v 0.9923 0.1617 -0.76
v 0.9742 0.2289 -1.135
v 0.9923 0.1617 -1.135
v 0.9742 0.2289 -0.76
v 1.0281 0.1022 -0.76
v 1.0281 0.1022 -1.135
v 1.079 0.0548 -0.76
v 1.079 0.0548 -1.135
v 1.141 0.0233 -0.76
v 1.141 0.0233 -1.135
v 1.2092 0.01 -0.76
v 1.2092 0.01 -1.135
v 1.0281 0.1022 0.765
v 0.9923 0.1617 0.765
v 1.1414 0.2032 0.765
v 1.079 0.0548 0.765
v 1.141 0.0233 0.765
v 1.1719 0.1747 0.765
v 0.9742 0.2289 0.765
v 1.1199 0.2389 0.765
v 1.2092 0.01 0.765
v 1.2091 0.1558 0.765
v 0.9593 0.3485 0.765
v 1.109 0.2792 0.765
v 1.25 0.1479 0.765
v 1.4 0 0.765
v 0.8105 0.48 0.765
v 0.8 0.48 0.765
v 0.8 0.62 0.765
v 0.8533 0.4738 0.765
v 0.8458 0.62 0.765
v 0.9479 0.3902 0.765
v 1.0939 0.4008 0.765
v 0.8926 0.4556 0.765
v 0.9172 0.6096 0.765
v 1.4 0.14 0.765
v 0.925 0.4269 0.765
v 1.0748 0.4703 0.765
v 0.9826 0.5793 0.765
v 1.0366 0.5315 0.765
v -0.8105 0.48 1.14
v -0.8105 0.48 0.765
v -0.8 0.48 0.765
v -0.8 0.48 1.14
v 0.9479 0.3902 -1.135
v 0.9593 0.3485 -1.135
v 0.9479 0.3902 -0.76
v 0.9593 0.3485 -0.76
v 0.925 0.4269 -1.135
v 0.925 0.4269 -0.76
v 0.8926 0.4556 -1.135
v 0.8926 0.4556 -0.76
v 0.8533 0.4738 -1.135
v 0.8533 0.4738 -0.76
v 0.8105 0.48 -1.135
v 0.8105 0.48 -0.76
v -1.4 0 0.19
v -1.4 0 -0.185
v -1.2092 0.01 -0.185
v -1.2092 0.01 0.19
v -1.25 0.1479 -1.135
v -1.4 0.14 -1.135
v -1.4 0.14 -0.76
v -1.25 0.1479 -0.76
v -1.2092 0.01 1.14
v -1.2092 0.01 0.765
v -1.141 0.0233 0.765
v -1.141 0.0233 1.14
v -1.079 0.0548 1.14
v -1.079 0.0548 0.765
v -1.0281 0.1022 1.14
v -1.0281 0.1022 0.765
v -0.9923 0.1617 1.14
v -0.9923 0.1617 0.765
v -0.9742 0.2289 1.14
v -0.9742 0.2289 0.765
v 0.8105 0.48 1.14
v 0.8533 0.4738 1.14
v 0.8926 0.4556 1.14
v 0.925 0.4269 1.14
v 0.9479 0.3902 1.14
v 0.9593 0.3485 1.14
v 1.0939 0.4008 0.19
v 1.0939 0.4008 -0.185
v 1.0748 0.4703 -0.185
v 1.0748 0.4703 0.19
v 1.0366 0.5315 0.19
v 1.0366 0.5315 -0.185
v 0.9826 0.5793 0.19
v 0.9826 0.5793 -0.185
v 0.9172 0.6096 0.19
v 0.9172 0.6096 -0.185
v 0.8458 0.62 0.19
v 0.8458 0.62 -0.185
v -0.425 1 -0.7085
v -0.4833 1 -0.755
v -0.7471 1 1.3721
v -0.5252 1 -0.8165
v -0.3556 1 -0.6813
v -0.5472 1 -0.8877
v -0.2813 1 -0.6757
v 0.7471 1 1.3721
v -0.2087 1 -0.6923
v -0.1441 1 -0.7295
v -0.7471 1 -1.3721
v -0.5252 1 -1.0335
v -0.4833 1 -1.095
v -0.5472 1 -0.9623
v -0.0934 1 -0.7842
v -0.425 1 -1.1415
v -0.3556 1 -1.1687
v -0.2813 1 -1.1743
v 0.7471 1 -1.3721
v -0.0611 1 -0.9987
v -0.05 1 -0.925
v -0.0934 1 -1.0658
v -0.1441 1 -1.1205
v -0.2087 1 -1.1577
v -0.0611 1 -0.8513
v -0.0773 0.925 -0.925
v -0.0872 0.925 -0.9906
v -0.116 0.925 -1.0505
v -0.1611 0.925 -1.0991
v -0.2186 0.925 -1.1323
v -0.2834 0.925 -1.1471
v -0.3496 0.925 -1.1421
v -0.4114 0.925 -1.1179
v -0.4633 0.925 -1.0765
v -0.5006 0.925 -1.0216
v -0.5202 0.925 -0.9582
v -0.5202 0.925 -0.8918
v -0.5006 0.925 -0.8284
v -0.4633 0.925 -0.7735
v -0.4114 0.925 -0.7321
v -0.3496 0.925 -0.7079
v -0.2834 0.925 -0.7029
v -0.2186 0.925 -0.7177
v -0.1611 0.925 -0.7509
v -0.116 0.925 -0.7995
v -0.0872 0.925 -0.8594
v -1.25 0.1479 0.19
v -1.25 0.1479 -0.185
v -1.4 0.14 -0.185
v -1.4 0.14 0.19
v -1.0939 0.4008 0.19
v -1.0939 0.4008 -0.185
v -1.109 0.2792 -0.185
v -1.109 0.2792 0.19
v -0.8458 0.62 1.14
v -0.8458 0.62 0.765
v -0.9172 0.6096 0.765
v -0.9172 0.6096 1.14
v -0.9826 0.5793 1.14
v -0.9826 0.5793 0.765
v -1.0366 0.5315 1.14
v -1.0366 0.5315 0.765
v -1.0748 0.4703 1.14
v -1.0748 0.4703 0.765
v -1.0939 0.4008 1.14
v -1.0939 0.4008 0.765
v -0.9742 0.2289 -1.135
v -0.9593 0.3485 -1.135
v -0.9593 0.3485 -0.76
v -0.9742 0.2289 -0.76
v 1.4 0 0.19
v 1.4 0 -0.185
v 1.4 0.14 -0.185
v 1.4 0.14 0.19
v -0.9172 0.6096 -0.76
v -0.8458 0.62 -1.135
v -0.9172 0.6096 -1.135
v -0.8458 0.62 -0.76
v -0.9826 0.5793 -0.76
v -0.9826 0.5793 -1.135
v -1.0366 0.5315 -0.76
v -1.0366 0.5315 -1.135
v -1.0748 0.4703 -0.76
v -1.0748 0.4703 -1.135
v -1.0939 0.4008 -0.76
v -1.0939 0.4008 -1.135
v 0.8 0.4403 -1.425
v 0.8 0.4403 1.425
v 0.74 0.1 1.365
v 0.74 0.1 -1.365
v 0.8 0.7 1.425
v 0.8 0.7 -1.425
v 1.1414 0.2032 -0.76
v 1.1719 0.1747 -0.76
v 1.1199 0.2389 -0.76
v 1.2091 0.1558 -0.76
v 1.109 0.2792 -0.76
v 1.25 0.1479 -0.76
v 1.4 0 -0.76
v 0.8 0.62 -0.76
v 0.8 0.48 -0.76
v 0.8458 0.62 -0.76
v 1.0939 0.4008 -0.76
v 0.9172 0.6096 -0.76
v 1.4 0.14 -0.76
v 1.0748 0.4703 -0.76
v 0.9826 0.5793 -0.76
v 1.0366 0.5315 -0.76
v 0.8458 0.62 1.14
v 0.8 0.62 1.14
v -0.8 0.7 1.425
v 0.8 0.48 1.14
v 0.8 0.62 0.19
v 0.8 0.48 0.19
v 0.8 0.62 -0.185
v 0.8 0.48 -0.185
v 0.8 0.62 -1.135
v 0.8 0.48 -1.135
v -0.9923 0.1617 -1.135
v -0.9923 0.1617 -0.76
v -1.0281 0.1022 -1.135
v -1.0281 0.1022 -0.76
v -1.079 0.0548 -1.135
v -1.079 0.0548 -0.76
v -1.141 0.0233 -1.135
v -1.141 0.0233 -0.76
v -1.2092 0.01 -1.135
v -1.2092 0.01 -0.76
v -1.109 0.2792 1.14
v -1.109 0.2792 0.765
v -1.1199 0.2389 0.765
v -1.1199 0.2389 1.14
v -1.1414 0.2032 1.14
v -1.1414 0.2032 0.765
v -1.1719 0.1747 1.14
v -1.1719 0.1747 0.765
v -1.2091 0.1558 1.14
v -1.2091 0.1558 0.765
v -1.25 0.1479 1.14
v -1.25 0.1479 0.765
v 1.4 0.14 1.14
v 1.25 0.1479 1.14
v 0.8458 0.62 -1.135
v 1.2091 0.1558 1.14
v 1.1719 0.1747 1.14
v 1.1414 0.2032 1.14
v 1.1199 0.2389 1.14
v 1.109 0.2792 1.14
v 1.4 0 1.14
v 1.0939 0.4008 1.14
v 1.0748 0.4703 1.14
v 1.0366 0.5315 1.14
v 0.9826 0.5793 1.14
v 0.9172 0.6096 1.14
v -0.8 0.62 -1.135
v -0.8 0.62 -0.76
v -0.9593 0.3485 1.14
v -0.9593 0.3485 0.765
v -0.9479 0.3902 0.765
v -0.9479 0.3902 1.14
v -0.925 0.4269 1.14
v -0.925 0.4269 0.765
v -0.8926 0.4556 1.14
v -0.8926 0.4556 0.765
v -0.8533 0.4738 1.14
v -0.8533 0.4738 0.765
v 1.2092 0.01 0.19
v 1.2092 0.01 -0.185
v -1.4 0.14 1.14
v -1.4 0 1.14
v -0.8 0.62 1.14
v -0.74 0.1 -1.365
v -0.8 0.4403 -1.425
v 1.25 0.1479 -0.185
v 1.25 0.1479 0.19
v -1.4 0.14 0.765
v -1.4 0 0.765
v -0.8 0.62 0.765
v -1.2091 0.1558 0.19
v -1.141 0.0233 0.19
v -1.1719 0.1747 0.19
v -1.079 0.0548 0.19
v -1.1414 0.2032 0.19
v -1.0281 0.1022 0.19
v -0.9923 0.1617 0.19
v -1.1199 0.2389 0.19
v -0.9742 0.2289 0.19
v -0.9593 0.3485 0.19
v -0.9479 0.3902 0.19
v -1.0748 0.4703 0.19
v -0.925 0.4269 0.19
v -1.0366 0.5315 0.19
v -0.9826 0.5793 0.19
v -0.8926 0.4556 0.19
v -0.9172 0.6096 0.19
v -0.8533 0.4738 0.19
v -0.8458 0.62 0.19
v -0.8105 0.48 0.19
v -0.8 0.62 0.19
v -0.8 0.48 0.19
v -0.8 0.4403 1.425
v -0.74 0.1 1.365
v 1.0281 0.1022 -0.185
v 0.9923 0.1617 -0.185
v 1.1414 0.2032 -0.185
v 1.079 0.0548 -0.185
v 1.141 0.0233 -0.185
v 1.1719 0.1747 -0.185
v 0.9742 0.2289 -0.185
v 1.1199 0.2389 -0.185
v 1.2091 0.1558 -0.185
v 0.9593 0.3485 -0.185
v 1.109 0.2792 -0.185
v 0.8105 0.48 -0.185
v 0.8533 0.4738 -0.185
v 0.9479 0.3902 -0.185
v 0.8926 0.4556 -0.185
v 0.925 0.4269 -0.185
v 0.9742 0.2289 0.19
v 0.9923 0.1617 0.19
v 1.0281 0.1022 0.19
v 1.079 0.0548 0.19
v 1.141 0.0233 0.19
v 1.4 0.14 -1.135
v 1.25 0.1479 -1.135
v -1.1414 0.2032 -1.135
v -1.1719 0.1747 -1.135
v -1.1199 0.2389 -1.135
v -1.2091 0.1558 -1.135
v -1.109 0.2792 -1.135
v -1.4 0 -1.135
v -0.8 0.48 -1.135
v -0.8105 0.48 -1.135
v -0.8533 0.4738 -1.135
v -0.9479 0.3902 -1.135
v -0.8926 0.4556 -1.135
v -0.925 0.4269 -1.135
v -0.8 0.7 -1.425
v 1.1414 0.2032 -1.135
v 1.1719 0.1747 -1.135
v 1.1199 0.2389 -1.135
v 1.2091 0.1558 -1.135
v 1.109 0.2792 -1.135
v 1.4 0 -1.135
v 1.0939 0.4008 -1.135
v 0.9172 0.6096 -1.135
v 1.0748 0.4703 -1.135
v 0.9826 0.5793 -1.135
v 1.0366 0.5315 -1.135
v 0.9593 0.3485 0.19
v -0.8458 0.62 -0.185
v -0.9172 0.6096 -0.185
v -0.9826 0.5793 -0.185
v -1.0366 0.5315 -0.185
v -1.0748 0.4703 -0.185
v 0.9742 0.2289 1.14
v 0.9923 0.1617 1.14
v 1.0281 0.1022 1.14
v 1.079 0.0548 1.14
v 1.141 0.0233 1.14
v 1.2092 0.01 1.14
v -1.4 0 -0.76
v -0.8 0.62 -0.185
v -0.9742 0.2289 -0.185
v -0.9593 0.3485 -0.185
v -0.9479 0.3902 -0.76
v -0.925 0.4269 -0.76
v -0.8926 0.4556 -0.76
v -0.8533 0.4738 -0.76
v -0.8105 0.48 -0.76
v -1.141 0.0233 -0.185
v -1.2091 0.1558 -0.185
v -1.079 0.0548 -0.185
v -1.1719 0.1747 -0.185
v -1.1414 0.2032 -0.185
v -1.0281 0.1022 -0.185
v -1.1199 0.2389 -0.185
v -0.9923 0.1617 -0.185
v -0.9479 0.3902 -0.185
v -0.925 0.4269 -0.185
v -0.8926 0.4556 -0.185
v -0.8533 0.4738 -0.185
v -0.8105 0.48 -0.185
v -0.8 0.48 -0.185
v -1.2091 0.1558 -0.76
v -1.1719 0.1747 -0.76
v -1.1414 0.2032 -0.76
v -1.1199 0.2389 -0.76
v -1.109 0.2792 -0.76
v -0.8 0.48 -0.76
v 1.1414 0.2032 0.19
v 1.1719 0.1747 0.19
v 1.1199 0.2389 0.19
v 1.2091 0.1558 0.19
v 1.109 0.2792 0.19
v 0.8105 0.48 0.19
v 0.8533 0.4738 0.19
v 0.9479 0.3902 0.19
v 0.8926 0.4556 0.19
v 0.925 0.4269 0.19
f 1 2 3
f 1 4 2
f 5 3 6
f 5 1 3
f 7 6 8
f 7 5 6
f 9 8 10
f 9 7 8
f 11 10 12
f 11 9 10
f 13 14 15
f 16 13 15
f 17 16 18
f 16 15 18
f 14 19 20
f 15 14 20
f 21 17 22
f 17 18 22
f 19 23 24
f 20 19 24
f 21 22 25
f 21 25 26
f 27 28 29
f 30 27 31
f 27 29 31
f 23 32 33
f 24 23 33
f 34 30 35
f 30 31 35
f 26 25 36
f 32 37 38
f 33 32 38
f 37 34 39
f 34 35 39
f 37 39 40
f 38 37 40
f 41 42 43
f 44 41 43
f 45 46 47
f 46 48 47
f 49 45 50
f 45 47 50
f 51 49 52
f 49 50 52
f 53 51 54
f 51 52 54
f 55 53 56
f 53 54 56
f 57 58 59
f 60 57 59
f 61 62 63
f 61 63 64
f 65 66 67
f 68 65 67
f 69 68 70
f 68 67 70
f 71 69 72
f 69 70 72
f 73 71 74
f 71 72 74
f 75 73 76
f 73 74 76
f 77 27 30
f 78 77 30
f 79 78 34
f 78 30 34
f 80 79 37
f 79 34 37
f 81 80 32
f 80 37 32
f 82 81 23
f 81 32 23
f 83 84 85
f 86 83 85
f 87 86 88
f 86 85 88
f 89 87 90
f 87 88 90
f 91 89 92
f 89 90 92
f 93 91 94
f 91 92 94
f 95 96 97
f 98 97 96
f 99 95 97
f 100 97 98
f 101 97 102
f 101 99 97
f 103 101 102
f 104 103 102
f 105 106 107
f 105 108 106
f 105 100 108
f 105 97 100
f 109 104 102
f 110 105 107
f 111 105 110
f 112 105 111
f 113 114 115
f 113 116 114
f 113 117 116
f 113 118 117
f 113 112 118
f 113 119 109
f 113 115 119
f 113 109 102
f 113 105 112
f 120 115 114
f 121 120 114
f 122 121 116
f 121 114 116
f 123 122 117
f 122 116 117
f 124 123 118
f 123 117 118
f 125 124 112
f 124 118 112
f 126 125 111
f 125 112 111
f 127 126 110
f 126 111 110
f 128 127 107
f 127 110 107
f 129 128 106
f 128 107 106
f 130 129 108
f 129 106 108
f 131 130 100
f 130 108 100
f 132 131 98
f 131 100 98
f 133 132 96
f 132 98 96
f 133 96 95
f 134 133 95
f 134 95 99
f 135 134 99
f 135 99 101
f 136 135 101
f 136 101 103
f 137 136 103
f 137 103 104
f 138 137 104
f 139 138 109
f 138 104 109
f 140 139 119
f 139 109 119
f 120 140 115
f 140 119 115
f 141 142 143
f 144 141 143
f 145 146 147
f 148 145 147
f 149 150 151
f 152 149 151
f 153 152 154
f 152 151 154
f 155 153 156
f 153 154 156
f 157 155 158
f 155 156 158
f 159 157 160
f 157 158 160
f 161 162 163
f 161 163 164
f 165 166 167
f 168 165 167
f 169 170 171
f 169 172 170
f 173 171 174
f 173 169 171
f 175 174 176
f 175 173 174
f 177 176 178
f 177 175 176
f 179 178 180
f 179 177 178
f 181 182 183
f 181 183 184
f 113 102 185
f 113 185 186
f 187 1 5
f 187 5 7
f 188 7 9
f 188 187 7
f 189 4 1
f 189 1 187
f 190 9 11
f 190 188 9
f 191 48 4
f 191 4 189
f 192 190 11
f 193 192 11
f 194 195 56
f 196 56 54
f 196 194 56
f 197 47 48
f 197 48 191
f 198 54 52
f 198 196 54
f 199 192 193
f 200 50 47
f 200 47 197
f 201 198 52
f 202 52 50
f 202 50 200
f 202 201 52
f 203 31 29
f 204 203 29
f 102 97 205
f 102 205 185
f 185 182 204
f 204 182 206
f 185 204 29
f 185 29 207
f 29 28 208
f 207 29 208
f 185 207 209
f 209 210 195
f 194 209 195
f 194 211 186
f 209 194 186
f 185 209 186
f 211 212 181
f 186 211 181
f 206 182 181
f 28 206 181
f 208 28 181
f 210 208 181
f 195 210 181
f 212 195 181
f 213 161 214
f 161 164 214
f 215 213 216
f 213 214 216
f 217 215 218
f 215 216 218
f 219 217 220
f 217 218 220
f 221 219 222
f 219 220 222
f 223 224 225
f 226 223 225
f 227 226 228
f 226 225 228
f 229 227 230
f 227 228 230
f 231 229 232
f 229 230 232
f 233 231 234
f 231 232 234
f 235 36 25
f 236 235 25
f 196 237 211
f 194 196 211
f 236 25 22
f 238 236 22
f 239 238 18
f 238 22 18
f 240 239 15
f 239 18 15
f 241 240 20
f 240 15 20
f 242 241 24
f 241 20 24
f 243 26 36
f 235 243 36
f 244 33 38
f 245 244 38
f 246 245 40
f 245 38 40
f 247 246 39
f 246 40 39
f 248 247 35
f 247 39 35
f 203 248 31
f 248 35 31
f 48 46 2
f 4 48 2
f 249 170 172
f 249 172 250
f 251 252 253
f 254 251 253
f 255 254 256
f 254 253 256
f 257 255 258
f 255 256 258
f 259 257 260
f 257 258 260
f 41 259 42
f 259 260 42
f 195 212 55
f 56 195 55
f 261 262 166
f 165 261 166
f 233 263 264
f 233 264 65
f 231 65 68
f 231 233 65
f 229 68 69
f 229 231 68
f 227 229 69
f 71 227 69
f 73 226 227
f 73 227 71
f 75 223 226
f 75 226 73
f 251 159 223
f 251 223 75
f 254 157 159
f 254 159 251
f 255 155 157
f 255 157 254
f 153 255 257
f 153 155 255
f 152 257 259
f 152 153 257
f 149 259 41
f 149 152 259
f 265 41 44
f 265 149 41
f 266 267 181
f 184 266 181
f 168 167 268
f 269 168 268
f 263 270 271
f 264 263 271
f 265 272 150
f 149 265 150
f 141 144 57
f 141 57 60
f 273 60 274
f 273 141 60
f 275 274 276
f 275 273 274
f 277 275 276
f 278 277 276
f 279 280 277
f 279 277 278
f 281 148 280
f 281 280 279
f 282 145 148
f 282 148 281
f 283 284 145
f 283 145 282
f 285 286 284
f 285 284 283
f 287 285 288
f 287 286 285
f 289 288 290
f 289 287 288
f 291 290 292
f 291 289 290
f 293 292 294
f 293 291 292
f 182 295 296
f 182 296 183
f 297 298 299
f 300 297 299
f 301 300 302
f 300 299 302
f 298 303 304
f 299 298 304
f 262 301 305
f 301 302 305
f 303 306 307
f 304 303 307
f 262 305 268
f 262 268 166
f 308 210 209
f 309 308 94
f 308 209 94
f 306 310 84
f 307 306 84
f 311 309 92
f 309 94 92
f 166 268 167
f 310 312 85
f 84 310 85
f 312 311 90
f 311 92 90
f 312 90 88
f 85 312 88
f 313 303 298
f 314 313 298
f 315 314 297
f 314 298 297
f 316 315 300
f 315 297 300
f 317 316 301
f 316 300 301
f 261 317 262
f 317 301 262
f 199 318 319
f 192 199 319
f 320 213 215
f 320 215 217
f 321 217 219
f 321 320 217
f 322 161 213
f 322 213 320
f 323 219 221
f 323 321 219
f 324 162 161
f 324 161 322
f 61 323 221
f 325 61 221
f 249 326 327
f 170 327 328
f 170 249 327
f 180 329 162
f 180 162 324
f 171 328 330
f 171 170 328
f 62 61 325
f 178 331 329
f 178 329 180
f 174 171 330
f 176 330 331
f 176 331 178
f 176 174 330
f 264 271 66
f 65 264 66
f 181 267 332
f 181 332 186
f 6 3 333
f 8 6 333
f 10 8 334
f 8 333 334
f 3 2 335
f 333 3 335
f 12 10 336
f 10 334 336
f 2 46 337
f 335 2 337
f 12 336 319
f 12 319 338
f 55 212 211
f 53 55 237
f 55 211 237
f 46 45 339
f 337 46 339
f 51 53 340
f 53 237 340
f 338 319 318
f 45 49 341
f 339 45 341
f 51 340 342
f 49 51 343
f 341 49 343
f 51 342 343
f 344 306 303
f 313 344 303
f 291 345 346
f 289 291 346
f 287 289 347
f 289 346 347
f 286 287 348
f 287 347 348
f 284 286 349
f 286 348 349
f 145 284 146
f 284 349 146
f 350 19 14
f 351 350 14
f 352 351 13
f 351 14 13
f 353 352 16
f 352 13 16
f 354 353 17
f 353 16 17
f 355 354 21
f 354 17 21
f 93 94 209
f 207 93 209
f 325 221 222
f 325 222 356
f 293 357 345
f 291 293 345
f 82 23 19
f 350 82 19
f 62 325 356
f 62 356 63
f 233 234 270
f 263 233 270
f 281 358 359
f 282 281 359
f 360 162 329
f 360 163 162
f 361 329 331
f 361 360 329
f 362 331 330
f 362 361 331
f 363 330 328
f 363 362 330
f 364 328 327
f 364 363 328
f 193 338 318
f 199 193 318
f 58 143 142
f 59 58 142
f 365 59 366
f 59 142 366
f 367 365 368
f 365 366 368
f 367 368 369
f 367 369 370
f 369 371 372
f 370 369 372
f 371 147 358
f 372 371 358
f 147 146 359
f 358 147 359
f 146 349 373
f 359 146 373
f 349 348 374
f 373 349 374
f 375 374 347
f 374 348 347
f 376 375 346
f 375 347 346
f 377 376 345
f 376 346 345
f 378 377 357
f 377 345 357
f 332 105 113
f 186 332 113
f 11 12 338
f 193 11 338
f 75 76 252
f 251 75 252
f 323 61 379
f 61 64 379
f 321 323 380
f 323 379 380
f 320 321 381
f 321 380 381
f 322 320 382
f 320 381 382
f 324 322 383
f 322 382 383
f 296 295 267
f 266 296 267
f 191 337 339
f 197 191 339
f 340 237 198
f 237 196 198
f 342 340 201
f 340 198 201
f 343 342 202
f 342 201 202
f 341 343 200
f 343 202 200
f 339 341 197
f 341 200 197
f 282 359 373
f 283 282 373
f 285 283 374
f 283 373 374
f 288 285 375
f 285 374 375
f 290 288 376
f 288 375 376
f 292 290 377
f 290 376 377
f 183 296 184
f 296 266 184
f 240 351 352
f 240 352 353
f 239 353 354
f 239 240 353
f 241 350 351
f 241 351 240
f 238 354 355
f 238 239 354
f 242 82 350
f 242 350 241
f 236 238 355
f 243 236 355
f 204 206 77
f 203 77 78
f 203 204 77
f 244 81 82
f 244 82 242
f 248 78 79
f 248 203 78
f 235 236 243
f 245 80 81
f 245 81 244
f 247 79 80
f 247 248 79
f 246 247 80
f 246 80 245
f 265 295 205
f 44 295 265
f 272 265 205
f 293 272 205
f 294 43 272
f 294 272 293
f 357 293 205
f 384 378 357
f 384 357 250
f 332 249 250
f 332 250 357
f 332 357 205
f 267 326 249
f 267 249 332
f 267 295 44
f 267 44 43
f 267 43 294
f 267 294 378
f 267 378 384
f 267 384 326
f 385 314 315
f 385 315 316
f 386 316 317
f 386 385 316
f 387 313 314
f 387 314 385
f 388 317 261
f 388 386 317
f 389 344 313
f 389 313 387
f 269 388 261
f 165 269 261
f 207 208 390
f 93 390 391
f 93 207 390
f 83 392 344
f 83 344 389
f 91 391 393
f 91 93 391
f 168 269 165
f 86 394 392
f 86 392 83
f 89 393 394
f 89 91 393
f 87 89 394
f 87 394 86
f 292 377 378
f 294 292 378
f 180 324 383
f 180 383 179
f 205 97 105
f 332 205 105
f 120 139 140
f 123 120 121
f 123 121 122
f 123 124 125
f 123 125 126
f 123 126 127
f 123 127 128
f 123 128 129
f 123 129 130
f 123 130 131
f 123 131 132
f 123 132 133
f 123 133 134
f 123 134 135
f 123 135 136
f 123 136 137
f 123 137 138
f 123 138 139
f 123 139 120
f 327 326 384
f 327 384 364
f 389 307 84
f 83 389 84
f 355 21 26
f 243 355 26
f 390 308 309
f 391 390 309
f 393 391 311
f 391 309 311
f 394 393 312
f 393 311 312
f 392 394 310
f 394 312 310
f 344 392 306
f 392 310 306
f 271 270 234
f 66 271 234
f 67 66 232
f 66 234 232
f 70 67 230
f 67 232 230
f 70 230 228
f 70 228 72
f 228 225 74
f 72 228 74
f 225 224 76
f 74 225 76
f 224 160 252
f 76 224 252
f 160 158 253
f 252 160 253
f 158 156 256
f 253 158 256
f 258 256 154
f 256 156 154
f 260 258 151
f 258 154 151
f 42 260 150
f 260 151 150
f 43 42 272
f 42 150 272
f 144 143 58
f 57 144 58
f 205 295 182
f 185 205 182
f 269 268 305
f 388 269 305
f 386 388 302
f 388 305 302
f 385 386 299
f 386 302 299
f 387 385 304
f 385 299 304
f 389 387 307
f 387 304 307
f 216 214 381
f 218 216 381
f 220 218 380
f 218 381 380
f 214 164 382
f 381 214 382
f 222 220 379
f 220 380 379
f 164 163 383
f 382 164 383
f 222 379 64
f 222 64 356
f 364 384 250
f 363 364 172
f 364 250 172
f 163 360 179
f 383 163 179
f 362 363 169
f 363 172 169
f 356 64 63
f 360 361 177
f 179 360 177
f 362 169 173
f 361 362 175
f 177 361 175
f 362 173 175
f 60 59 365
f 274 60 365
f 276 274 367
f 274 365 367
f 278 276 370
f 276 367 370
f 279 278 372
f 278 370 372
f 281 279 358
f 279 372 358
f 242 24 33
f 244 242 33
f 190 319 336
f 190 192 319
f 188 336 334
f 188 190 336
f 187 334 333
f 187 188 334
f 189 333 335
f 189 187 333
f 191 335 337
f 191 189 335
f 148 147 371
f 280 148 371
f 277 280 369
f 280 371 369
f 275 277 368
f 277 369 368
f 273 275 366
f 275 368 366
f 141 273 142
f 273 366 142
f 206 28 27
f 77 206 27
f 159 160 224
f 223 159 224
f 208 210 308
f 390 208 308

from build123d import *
from OCP.BRepFilletAPI import BRepFilletAPI_MakeChamfer

# Parameters (mm, degrees)
SKETCH1_W            = 1.6
SKETCH1_H            = 2.85
BOSS_EXTRUDE1_DEPTH  = 0.9
CHAMFER1_SIZE        = 0.06
CHAMFER1_SIZE2       = 0.340276909
CHAMFER2_SIZE        = 0.3
CHAMFER2_SIZE2       = 0.052898094
SKETCH3_R            = 0.25
MARK_PIN1_DEPTH      = 0.075
MARK_PIN1_DRAFT      = -20
PIN_EXTRUDE_DEPTH    = 0.375
FILLET1_R            = 0.15
FILLET2_R            = 0.25
FILLET1_OF_MIRROR1_R = 0.15
FILLET2_OF_MIRROR1_R = 0.25
PIN_PATTERN_START    = -0.185
PIN_PATTERN_DEPTH    = 0.375
PIN_PATTERN_START_2  = 0.765
PIN_PATTERN_2_DEPTH  = 0.375


# Read off the part's stored shape, not the designer's step: pin_pattern
with BuildPart() as part:
    # Sketch1 → Boss-Extrude1 (new body)
    with BuildSketch(Plane(origin=(0, 0.1, 0), x_dir=(1, 0, 0), z_dir=(0, 1, 0))):
        Rectangle(SKETCH1_W, SKETCH1_H)
    extrude(amount=BOSS_EXTRUDE1_DEPTH)

    # Chamfer1
    chamfer1_edges = [part.edges().sort_by_distance(p)[0] for p in [
        (0, 0.1, 1.425),
        (-0.8, 0.1, 0),
        (0, 0.1, -1.425),
        (0.8, 0.1, 0),
    ]]
    chamfer1_side = [part.faces().sort_by_distance(p)[0] for p in [
        (0, 0.1, 0),
    ]]
    chamfer(chamfer1_edges, length=CHAMFER1_SIZE, length2=CHAMFER1_SIZE2, reference=chamfer1_side[0])

    # Chamfer2: one chamfer whose edges measure the first distance from different faces: ONE call of the kernel's chamfer builder (chamfer() names one face for all edges)
    chamfer2_edges_1 = [part.edges().sort_by_distance(p)[0] for p in [
        (-0.8, 1, 0),
    ]]
    chamfer2_side_1 = [part.faces().sort_by_distance(p)[0] for p in [
        (-0.8, 0.720138455, 0),
    ]]
    chamfer2_edges_2 = [part.edges().sort_by_distance(p)[0] for p in [
        (0, 1, 1.425),
    ]]
    chamfer2_side_2 = [part.faces().sort_by_distance(p)[0] for p in [
        (0, 0.720138455, 1.425),
    ]]
    chamfer2_edges_3 = [part.edges().sort_by_distance(p)[0] for p in [
        (0.8, 1, 0),
    ]]
    chamfer2_side_3 = [part.faces().sort_by_distance(p)[0] for p in [
        (0.8, 0.720138455, 0),
    ]]
    chamfer2_edges_4 = [part.edges().sort_by_distance(p)[0] for p in [
        (0, 1, -1.425),
    ]]
    chamfer2_side_4 = [part.faces().sort_by_distance(p)[0] for p in [
        (0, 0.720138455, -1.425),
    ]]
    chamfer2 = BRepFilletAPI_MakeChamfer(part.part.solid().wrapped)
    for e in chamfer2_edges_1:
        chamfer2.Add(CHAMFER2_SIZE, CHAMFER2_SIZE2, e.wrapped, chamfer2_side_1[0].wrapped)  # the first distance lies on this face
    for e in chamfer2_edges_2:
        chamfer2.Add(CHAMFER2_SIZE, CHAMFER2_SIZE2, e.wrapped, chamfer2_side_2[0].wrapped)  # the first distance lies on this face
    for e in chamfer2_edges_3:
        chamfer2.Add(CHAMFER2_SIZE, CHAMFER2_SIZE2, e.wrapped, chamfer2_side_3[0].wrapped)  # the first distance lies on this face
    for e in chamfer2_edges_4:
        chamfer2.Add(CHAMFER2_SIZE, CHAMFER2_SIZE2, e.wrapped, chamfer2_side_4[0].wrapped)  # the first distance lies on this face
    add(Compound.cast(chamfer2.Shape()), mode=Mode.REPLACE)


with BuildPart() as mark_pin1_tool:
    # Sketch3 → mark pin1 (with draft: the straight prism first)
    with BuildSketch(Plane(origin=(0, 1, 0), x_dir=(1, 0, 0), z_dir=(0, 1, 0))):
        with Locations((-0.3, 0.925)):
            Circle(SKETCH3_R)
    extrude(amount=-MARK_PIN1_DEPTH)
    # mark pin1: the draft: its side faces are tilted about the plane it starts from
    mark_pin1_sides = [mark_pin1_tool.faces().sort_by_distance(p)[0] for p in [
        (-0.55, 0.9625, -0.925),
    ]]
    draft(mark_pin1_sides, Plane(origin=(0, 1, 0), x_dir=(1, 0, 0), z_dir=(0, 1, 0)), MARK_PIN1_DRAFT)


with BuildPart() as part_1:
    add(part.part)

    # mark pin1: cut by mark_pin1_tool
    add(mark_pin1_tool.part, mode=Mode.SUBTRACT)

    # Sketch2 → pin extrude (add)
    with BuildSketch(Plane(origin=(0, 0, -1.135), x_dir=(-1, 0, 0), z_dir=(0, 0, -1))):
        Polygon((1.4, 0), (1.4, 0.14), (1.124504771, 0.154438093), (1.066708826, 0.62), (0, 0.62), (0, 0.48), (0.943014086, 0.48), (1, 0.020963112), align=None)
    pin_extrude = extrude(amount=-PIN_EXTRUDE_DEPTH)

    # Fillet1
    fillet1_edges = [part_1.edges().sort_by_distance(p)[0] for p in [
        (-0.943014086, 0.48, -0.9475),
        (-1.124504771, 0.154438093, -0.9475),
    ]]
    fillet(fillet1_edges, radius=FILLET1_R)

    # Fillet2
    fillet2_edges = [part_1.edges().sort_by_distance(p)[0] for p in [
        (-1, 0.020963112, -0.9475),
        (-1.066708826, 0.62, -0.9475),
    ]]
    fillet(fillet2_edges, radius=FILLET2_R)

    # Mirror1: pin extrude across plane
    add(pin_extrude.mirror(Plane(origin=(0, 0, 0), x_dir=(0, 0, 1), z_dir=(1, 0, 0))))

    # Fillet1 of Mirror1
    fillet1_of_mirror1_edges = [part_1.edges().sort_by_distance(p)[0] for p in [
        (0.943014086, 0.48, -0.9475),
        (1.124504771, 0.154438093, -0.9475),
    ]]
    fillet(fillet1_of_mirror1_edges, radius=FILLET1_OF_MIRROR1_R)

    # Fillet2 of Mirror1
    fillet2_of_mirror1_edges = [part_1.edges().sort_by_distance(p)[0] for p in [
        (1, 0.020963112, -0.9475),
        (1.066708826, 0.62, -0.9475),
    ]]
    fillet(fillet2_of_mirror1_edges, radius=FILLET2_OF_MIRROR1_R)

    # pin_pattern outline → pin_pattern (add)
    with BuildSketch(Plane.XY.offset(PIN_PATTERN_START)):
        with BuildLine():
            Line((0.8, 0.48), (0.810484007, 0.48))
            ThreePointArc((0.810484007, 0.48), (0.909801869, 0.442409797), (0.959341349, 0.348479499))
            Line((0.959341349, 0.348479499), (0.974191509, 0.228857461))
            ThreePointArc((0.974191509, 0.228857461), (1.05190979, 0.076704229), (1.209203089, 0.009999242))
            Line((1.209203089, 0.009999242), (1.4, 0))
            Line((1.4, 0), (1.4, 0.14))
            Line((1.4, 0.14), (1.250026624, 0.147859772))
            ThreePointArc((1.250026624, 0.147859772), (1.155650645, 0.187882764), (1.109019676, 0.279174703))
            Line((1.109019676, 0.279174703), (1.093920931, 0.400799165))
            ThreePointArc((1.093920931, 0.400799165), (1.011355131, 0.557349661), (0.845825362, 0.62))
            Line((0.845825362, 0.62), (0.8, 0.62))
            Line((0.8, 0.62), (0.8, 0.48))
        make_face()
        with BuildLine():
            ThreePointArc((-0.959341349, 0.348479499), (-0.909801869, 0.442409797), (-0.810484007, 0.48))
            Line((-0.810484007, 0.48), (-0.8, 0.48))
            Line((-0.8, 0.48), (-0.8, 0.62))
            Line((-0.8, 0.62), (-0.845825362, 0.62))
            ThreePointArc((-0.845825362, 0.62), (-1.011355131, 0.557349661), (-1.093920931, 0.400799165))
            Line((-1.093920931, 0.400799165), (-1.109019676, 0.279174703))
            ThreePointArc((-1.109019676, 0.279174703), (-1.155650645, 0.187882764), (-1.250026624, 0.147859772))
            Line((-1.250026624, 0.147859772), (-1.4, 0.14))
            Line((-1.4, 0.14), (-1.4, 0))
            Line((-1.4, 0), (-1.209203089, 0.009999242))
            ThreePointArc((-1.209203089, 0.009999242), (-1.05190979, 0.076704229), (-0.974191509, 0.228857461))
            Line((-0.974191509, 0.228857461), (-0.959341349, 0.348479499))
        make_face()
    extrude(amount=PIN_PATTERN_DEPTH)

    # pin_pattern 2 outline → pin_pattern 2 (add)
    with BuildSketch(Plane.XY.offset(PIN_PATTERN_START_2)):
        with BuildLine():
            Line((0.8, 0.48), (0.810484007, 0.48))
            ThreePointArc((0.810484007, 0.48), (0.909801869, 0.442409797), (0.959341349, 0.348479499))
            Line((0.959341349, 0.348479499), (0.974191509, 0.228857461))
            ThreePointArc((0.974191509, 0.228857461), (1.05190979, 0.076704229), (1.209203089, 0.009999242))
            Line((1.209203089, 0.009999242), (1.4, 0))
            Line((1.4, 0), (1.4, 0.14))
            Line((1.4, 0.14), (1.250026624, 0.147859772))
            ThreePointArc((1.250026624, 0.147859772), (1.155650645, 0.187882764), (1.109019676, 0.279174703))
            Line((1.109019676, 0.279174703), (1.093920931, 0.400799165))
            ThreePointArc((1.093920931, 0.400799165), (1.011355131, 0.557349661), (0.845825362, 0.62))
            Line((0.845825362, 0.62), (0.8, 0.62))
            Line((0.8, 0.62), (0.8, 0.48))
        make_face()
        with BuildLine():
            ThreePointArc((-0.959341349, 0.348479499), (-0.909801869, 0.442409797), (-0.810484007, 0.48))
            Line((-0.810484007, 0.48), (-0.8, 0.48))
            Line((-0.8, 0.48), (-0.8, 0.62))
            Line((-0.8, 0.62), (-0.845825362, 0.62))
            ThreePointArc((-0.845825362, 0.62), (-1.011355131, 0.557349661), (-1.093920931, 0.400799165))
            Line((-1.093920931, 0.400799165), (-1.109019676, 0.279174703))
            ThreePointArc((-1.109019676, 0.279174703), (-1.155650645, 0.187882764), (-1.250026624, 0.147859772))
            Line((-1.250026624, 0.147859772), (-1.4, 0.14))
            Line((-1.4, 0.14), (-1.4, 0))
            Line((-1.4, 0), (-1.209203089, 0.009999242))
            ThreePointArc((-1.209203089, 0.009999242), (-1.05190979, 0.076704229), (-0.974191509, 0.228857461))
            Line((-0.974191509, 0.228857461), (-0.959341349, 0.348479499))
        make_face()
    extrude(amount=PIN_PATTERN_2_DEPTH)


solid = part_1.part
